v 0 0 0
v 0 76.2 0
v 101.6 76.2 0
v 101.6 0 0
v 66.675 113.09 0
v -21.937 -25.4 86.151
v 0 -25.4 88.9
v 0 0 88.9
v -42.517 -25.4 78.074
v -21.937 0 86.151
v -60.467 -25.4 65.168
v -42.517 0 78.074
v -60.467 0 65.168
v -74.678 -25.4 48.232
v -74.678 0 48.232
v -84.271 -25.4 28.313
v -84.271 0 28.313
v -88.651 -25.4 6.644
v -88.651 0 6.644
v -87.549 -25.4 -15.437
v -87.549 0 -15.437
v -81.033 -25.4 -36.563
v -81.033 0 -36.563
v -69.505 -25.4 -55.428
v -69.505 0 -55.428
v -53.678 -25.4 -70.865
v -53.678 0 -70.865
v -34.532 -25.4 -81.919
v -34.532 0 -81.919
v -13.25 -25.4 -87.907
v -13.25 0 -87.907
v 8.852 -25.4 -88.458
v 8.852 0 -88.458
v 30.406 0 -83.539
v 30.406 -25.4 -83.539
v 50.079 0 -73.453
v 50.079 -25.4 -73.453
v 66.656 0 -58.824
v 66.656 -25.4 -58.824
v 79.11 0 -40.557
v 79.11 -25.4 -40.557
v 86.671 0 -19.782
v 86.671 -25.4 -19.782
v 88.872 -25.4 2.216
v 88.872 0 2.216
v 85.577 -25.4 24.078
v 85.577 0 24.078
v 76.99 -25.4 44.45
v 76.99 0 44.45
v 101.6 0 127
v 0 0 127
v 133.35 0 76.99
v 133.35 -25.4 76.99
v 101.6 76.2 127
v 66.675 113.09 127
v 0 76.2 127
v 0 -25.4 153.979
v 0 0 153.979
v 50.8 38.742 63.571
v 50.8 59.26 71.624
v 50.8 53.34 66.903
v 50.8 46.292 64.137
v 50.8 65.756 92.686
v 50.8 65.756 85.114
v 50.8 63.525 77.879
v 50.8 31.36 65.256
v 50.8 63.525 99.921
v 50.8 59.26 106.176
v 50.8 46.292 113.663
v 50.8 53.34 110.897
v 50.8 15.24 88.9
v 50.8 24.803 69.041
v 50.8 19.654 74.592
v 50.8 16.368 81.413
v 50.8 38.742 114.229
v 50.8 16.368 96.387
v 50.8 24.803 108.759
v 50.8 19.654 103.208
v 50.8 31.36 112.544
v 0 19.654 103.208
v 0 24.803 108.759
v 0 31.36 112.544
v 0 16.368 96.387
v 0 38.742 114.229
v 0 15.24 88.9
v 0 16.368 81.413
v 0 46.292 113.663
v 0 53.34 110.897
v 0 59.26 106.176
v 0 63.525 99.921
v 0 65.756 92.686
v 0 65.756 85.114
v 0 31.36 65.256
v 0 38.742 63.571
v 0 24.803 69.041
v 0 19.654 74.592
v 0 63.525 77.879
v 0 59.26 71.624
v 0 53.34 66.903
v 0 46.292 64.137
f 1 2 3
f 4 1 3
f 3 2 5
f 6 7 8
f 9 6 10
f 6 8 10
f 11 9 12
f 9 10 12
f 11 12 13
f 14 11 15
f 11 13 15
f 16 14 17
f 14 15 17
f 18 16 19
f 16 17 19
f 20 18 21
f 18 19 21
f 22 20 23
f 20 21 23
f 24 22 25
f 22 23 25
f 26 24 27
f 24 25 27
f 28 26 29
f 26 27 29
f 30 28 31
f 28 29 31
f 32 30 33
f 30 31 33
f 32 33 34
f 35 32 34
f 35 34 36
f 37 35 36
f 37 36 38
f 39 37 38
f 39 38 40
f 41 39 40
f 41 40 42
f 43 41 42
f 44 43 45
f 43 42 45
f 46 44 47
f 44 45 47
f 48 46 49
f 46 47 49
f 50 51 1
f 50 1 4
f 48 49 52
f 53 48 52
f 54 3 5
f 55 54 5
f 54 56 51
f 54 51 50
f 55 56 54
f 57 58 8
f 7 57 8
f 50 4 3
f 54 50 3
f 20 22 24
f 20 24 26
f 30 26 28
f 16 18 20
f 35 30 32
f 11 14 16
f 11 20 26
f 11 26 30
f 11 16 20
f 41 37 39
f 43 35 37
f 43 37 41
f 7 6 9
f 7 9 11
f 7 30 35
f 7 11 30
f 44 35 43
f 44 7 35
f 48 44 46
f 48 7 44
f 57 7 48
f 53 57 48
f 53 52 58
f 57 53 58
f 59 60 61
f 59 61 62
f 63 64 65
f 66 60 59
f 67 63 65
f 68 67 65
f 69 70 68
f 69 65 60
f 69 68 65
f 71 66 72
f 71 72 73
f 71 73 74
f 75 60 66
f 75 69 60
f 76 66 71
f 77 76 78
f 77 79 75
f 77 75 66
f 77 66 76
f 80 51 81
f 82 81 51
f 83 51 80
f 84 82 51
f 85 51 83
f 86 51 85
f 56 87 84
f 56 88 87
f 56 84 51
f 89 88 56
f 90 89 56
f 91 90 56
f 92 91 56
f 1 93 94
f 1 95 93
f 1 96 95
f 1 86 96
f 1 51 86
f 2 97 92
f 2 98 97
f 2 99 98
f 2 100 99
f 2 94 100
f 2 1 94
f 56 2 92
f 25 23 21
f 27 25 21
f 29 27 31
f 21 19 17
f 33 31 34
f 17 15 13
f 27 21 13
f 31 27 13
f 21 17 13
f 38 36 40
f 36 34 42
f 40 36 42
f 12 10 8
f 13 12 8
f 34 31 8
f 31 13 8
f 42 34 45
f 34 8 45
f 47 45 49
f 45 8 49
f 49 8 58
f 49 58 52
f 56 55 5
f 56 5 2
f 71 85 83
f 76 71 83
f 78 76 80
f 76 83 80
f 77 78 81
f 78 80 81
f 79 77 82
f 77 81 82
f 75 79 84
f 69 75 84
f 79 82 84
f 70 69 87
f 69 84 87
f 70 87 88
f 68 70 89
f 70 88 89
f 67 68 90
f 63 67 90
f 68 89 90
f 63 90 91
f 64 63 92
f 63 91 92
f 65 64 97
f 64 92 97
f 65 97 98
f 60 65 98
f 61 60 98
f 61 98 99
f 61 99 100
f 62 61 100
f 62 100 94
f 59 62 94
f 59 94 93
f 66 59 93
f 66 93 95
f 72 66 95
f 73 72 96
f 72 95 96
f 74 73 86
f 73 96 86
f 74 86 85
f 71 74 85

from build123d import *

# Parameters (mm, degrees)
F1_W     = 101.6
F1_H     = 76.2
F2_DEPTH = 127
F3_R     = 25.4
F4_DEPTH = 50.8
F5_DEPTH = 25.4


with BuildPart() as f2:
    # F1 (on Top) → F2 (new body)
    with BuildSketch(Plane.XY):
        with Locations((50.8, 38.1)):
            Rectangle(F1_W, F1_H)
        Polygon((66.675, 113.0901663726), (0, 76.2), (101.6, 76.2), align=None)
    extrude(amount=F2_DEPTH)

    # F3 (on face) → F4 (cut)
    with BuildSketch(Plane(origin=(0, 0, 0), x_dir=(0, -1, 0), z_dir=(-1, 0, 0))):
        with Locations((-40.64, 88.9)):
            Circle(F3_R)
    extrude(amount=-F4_DEPTH, mode=Mode.SUBTRACT)


with BuildPart() as f5:
    # F0 (on Front) → F5 (new body)
    with BuildSketch(Plane.XZ):
        with BuildLine():
            ThreePointArc((0, 88.9), (-62.8617928475, -62.8617928475), (88.9, 0))
            ThreePointArc((88.9, 0), (85.8708059571, 23.0090131096), (76.9896583964, 44.45))
            Line((76.9896583964, 44.45), (0, 0))
            Line((0, 0), (0, 88.9))
        make_face()
        with BuildLine():
            Line((0, 0), (76.9896583964, 44.45))
            ThreePointArc((76.9896583964, 44.45), (44.45, 76.9896583964), (0, 88.9))
            Line((0, 88.9), (0, 0))
        make_face()
        with BuildLine():
            ThreePointArc((0, 88.9), (44.45, 76.9896583964), (76.9896583964, 44.45))
            Line((76.9896583964, 44.45), (133.35, 76.9896583964))
            Line((133.35, 76.9896583964), (0, 153.9793167929))
            Line((0, 153.9793167929), (0, 88.9))
        make_face()
    extrude(amount=F5_DEPTH)


solid = Compound([f2.part, f5.part])
